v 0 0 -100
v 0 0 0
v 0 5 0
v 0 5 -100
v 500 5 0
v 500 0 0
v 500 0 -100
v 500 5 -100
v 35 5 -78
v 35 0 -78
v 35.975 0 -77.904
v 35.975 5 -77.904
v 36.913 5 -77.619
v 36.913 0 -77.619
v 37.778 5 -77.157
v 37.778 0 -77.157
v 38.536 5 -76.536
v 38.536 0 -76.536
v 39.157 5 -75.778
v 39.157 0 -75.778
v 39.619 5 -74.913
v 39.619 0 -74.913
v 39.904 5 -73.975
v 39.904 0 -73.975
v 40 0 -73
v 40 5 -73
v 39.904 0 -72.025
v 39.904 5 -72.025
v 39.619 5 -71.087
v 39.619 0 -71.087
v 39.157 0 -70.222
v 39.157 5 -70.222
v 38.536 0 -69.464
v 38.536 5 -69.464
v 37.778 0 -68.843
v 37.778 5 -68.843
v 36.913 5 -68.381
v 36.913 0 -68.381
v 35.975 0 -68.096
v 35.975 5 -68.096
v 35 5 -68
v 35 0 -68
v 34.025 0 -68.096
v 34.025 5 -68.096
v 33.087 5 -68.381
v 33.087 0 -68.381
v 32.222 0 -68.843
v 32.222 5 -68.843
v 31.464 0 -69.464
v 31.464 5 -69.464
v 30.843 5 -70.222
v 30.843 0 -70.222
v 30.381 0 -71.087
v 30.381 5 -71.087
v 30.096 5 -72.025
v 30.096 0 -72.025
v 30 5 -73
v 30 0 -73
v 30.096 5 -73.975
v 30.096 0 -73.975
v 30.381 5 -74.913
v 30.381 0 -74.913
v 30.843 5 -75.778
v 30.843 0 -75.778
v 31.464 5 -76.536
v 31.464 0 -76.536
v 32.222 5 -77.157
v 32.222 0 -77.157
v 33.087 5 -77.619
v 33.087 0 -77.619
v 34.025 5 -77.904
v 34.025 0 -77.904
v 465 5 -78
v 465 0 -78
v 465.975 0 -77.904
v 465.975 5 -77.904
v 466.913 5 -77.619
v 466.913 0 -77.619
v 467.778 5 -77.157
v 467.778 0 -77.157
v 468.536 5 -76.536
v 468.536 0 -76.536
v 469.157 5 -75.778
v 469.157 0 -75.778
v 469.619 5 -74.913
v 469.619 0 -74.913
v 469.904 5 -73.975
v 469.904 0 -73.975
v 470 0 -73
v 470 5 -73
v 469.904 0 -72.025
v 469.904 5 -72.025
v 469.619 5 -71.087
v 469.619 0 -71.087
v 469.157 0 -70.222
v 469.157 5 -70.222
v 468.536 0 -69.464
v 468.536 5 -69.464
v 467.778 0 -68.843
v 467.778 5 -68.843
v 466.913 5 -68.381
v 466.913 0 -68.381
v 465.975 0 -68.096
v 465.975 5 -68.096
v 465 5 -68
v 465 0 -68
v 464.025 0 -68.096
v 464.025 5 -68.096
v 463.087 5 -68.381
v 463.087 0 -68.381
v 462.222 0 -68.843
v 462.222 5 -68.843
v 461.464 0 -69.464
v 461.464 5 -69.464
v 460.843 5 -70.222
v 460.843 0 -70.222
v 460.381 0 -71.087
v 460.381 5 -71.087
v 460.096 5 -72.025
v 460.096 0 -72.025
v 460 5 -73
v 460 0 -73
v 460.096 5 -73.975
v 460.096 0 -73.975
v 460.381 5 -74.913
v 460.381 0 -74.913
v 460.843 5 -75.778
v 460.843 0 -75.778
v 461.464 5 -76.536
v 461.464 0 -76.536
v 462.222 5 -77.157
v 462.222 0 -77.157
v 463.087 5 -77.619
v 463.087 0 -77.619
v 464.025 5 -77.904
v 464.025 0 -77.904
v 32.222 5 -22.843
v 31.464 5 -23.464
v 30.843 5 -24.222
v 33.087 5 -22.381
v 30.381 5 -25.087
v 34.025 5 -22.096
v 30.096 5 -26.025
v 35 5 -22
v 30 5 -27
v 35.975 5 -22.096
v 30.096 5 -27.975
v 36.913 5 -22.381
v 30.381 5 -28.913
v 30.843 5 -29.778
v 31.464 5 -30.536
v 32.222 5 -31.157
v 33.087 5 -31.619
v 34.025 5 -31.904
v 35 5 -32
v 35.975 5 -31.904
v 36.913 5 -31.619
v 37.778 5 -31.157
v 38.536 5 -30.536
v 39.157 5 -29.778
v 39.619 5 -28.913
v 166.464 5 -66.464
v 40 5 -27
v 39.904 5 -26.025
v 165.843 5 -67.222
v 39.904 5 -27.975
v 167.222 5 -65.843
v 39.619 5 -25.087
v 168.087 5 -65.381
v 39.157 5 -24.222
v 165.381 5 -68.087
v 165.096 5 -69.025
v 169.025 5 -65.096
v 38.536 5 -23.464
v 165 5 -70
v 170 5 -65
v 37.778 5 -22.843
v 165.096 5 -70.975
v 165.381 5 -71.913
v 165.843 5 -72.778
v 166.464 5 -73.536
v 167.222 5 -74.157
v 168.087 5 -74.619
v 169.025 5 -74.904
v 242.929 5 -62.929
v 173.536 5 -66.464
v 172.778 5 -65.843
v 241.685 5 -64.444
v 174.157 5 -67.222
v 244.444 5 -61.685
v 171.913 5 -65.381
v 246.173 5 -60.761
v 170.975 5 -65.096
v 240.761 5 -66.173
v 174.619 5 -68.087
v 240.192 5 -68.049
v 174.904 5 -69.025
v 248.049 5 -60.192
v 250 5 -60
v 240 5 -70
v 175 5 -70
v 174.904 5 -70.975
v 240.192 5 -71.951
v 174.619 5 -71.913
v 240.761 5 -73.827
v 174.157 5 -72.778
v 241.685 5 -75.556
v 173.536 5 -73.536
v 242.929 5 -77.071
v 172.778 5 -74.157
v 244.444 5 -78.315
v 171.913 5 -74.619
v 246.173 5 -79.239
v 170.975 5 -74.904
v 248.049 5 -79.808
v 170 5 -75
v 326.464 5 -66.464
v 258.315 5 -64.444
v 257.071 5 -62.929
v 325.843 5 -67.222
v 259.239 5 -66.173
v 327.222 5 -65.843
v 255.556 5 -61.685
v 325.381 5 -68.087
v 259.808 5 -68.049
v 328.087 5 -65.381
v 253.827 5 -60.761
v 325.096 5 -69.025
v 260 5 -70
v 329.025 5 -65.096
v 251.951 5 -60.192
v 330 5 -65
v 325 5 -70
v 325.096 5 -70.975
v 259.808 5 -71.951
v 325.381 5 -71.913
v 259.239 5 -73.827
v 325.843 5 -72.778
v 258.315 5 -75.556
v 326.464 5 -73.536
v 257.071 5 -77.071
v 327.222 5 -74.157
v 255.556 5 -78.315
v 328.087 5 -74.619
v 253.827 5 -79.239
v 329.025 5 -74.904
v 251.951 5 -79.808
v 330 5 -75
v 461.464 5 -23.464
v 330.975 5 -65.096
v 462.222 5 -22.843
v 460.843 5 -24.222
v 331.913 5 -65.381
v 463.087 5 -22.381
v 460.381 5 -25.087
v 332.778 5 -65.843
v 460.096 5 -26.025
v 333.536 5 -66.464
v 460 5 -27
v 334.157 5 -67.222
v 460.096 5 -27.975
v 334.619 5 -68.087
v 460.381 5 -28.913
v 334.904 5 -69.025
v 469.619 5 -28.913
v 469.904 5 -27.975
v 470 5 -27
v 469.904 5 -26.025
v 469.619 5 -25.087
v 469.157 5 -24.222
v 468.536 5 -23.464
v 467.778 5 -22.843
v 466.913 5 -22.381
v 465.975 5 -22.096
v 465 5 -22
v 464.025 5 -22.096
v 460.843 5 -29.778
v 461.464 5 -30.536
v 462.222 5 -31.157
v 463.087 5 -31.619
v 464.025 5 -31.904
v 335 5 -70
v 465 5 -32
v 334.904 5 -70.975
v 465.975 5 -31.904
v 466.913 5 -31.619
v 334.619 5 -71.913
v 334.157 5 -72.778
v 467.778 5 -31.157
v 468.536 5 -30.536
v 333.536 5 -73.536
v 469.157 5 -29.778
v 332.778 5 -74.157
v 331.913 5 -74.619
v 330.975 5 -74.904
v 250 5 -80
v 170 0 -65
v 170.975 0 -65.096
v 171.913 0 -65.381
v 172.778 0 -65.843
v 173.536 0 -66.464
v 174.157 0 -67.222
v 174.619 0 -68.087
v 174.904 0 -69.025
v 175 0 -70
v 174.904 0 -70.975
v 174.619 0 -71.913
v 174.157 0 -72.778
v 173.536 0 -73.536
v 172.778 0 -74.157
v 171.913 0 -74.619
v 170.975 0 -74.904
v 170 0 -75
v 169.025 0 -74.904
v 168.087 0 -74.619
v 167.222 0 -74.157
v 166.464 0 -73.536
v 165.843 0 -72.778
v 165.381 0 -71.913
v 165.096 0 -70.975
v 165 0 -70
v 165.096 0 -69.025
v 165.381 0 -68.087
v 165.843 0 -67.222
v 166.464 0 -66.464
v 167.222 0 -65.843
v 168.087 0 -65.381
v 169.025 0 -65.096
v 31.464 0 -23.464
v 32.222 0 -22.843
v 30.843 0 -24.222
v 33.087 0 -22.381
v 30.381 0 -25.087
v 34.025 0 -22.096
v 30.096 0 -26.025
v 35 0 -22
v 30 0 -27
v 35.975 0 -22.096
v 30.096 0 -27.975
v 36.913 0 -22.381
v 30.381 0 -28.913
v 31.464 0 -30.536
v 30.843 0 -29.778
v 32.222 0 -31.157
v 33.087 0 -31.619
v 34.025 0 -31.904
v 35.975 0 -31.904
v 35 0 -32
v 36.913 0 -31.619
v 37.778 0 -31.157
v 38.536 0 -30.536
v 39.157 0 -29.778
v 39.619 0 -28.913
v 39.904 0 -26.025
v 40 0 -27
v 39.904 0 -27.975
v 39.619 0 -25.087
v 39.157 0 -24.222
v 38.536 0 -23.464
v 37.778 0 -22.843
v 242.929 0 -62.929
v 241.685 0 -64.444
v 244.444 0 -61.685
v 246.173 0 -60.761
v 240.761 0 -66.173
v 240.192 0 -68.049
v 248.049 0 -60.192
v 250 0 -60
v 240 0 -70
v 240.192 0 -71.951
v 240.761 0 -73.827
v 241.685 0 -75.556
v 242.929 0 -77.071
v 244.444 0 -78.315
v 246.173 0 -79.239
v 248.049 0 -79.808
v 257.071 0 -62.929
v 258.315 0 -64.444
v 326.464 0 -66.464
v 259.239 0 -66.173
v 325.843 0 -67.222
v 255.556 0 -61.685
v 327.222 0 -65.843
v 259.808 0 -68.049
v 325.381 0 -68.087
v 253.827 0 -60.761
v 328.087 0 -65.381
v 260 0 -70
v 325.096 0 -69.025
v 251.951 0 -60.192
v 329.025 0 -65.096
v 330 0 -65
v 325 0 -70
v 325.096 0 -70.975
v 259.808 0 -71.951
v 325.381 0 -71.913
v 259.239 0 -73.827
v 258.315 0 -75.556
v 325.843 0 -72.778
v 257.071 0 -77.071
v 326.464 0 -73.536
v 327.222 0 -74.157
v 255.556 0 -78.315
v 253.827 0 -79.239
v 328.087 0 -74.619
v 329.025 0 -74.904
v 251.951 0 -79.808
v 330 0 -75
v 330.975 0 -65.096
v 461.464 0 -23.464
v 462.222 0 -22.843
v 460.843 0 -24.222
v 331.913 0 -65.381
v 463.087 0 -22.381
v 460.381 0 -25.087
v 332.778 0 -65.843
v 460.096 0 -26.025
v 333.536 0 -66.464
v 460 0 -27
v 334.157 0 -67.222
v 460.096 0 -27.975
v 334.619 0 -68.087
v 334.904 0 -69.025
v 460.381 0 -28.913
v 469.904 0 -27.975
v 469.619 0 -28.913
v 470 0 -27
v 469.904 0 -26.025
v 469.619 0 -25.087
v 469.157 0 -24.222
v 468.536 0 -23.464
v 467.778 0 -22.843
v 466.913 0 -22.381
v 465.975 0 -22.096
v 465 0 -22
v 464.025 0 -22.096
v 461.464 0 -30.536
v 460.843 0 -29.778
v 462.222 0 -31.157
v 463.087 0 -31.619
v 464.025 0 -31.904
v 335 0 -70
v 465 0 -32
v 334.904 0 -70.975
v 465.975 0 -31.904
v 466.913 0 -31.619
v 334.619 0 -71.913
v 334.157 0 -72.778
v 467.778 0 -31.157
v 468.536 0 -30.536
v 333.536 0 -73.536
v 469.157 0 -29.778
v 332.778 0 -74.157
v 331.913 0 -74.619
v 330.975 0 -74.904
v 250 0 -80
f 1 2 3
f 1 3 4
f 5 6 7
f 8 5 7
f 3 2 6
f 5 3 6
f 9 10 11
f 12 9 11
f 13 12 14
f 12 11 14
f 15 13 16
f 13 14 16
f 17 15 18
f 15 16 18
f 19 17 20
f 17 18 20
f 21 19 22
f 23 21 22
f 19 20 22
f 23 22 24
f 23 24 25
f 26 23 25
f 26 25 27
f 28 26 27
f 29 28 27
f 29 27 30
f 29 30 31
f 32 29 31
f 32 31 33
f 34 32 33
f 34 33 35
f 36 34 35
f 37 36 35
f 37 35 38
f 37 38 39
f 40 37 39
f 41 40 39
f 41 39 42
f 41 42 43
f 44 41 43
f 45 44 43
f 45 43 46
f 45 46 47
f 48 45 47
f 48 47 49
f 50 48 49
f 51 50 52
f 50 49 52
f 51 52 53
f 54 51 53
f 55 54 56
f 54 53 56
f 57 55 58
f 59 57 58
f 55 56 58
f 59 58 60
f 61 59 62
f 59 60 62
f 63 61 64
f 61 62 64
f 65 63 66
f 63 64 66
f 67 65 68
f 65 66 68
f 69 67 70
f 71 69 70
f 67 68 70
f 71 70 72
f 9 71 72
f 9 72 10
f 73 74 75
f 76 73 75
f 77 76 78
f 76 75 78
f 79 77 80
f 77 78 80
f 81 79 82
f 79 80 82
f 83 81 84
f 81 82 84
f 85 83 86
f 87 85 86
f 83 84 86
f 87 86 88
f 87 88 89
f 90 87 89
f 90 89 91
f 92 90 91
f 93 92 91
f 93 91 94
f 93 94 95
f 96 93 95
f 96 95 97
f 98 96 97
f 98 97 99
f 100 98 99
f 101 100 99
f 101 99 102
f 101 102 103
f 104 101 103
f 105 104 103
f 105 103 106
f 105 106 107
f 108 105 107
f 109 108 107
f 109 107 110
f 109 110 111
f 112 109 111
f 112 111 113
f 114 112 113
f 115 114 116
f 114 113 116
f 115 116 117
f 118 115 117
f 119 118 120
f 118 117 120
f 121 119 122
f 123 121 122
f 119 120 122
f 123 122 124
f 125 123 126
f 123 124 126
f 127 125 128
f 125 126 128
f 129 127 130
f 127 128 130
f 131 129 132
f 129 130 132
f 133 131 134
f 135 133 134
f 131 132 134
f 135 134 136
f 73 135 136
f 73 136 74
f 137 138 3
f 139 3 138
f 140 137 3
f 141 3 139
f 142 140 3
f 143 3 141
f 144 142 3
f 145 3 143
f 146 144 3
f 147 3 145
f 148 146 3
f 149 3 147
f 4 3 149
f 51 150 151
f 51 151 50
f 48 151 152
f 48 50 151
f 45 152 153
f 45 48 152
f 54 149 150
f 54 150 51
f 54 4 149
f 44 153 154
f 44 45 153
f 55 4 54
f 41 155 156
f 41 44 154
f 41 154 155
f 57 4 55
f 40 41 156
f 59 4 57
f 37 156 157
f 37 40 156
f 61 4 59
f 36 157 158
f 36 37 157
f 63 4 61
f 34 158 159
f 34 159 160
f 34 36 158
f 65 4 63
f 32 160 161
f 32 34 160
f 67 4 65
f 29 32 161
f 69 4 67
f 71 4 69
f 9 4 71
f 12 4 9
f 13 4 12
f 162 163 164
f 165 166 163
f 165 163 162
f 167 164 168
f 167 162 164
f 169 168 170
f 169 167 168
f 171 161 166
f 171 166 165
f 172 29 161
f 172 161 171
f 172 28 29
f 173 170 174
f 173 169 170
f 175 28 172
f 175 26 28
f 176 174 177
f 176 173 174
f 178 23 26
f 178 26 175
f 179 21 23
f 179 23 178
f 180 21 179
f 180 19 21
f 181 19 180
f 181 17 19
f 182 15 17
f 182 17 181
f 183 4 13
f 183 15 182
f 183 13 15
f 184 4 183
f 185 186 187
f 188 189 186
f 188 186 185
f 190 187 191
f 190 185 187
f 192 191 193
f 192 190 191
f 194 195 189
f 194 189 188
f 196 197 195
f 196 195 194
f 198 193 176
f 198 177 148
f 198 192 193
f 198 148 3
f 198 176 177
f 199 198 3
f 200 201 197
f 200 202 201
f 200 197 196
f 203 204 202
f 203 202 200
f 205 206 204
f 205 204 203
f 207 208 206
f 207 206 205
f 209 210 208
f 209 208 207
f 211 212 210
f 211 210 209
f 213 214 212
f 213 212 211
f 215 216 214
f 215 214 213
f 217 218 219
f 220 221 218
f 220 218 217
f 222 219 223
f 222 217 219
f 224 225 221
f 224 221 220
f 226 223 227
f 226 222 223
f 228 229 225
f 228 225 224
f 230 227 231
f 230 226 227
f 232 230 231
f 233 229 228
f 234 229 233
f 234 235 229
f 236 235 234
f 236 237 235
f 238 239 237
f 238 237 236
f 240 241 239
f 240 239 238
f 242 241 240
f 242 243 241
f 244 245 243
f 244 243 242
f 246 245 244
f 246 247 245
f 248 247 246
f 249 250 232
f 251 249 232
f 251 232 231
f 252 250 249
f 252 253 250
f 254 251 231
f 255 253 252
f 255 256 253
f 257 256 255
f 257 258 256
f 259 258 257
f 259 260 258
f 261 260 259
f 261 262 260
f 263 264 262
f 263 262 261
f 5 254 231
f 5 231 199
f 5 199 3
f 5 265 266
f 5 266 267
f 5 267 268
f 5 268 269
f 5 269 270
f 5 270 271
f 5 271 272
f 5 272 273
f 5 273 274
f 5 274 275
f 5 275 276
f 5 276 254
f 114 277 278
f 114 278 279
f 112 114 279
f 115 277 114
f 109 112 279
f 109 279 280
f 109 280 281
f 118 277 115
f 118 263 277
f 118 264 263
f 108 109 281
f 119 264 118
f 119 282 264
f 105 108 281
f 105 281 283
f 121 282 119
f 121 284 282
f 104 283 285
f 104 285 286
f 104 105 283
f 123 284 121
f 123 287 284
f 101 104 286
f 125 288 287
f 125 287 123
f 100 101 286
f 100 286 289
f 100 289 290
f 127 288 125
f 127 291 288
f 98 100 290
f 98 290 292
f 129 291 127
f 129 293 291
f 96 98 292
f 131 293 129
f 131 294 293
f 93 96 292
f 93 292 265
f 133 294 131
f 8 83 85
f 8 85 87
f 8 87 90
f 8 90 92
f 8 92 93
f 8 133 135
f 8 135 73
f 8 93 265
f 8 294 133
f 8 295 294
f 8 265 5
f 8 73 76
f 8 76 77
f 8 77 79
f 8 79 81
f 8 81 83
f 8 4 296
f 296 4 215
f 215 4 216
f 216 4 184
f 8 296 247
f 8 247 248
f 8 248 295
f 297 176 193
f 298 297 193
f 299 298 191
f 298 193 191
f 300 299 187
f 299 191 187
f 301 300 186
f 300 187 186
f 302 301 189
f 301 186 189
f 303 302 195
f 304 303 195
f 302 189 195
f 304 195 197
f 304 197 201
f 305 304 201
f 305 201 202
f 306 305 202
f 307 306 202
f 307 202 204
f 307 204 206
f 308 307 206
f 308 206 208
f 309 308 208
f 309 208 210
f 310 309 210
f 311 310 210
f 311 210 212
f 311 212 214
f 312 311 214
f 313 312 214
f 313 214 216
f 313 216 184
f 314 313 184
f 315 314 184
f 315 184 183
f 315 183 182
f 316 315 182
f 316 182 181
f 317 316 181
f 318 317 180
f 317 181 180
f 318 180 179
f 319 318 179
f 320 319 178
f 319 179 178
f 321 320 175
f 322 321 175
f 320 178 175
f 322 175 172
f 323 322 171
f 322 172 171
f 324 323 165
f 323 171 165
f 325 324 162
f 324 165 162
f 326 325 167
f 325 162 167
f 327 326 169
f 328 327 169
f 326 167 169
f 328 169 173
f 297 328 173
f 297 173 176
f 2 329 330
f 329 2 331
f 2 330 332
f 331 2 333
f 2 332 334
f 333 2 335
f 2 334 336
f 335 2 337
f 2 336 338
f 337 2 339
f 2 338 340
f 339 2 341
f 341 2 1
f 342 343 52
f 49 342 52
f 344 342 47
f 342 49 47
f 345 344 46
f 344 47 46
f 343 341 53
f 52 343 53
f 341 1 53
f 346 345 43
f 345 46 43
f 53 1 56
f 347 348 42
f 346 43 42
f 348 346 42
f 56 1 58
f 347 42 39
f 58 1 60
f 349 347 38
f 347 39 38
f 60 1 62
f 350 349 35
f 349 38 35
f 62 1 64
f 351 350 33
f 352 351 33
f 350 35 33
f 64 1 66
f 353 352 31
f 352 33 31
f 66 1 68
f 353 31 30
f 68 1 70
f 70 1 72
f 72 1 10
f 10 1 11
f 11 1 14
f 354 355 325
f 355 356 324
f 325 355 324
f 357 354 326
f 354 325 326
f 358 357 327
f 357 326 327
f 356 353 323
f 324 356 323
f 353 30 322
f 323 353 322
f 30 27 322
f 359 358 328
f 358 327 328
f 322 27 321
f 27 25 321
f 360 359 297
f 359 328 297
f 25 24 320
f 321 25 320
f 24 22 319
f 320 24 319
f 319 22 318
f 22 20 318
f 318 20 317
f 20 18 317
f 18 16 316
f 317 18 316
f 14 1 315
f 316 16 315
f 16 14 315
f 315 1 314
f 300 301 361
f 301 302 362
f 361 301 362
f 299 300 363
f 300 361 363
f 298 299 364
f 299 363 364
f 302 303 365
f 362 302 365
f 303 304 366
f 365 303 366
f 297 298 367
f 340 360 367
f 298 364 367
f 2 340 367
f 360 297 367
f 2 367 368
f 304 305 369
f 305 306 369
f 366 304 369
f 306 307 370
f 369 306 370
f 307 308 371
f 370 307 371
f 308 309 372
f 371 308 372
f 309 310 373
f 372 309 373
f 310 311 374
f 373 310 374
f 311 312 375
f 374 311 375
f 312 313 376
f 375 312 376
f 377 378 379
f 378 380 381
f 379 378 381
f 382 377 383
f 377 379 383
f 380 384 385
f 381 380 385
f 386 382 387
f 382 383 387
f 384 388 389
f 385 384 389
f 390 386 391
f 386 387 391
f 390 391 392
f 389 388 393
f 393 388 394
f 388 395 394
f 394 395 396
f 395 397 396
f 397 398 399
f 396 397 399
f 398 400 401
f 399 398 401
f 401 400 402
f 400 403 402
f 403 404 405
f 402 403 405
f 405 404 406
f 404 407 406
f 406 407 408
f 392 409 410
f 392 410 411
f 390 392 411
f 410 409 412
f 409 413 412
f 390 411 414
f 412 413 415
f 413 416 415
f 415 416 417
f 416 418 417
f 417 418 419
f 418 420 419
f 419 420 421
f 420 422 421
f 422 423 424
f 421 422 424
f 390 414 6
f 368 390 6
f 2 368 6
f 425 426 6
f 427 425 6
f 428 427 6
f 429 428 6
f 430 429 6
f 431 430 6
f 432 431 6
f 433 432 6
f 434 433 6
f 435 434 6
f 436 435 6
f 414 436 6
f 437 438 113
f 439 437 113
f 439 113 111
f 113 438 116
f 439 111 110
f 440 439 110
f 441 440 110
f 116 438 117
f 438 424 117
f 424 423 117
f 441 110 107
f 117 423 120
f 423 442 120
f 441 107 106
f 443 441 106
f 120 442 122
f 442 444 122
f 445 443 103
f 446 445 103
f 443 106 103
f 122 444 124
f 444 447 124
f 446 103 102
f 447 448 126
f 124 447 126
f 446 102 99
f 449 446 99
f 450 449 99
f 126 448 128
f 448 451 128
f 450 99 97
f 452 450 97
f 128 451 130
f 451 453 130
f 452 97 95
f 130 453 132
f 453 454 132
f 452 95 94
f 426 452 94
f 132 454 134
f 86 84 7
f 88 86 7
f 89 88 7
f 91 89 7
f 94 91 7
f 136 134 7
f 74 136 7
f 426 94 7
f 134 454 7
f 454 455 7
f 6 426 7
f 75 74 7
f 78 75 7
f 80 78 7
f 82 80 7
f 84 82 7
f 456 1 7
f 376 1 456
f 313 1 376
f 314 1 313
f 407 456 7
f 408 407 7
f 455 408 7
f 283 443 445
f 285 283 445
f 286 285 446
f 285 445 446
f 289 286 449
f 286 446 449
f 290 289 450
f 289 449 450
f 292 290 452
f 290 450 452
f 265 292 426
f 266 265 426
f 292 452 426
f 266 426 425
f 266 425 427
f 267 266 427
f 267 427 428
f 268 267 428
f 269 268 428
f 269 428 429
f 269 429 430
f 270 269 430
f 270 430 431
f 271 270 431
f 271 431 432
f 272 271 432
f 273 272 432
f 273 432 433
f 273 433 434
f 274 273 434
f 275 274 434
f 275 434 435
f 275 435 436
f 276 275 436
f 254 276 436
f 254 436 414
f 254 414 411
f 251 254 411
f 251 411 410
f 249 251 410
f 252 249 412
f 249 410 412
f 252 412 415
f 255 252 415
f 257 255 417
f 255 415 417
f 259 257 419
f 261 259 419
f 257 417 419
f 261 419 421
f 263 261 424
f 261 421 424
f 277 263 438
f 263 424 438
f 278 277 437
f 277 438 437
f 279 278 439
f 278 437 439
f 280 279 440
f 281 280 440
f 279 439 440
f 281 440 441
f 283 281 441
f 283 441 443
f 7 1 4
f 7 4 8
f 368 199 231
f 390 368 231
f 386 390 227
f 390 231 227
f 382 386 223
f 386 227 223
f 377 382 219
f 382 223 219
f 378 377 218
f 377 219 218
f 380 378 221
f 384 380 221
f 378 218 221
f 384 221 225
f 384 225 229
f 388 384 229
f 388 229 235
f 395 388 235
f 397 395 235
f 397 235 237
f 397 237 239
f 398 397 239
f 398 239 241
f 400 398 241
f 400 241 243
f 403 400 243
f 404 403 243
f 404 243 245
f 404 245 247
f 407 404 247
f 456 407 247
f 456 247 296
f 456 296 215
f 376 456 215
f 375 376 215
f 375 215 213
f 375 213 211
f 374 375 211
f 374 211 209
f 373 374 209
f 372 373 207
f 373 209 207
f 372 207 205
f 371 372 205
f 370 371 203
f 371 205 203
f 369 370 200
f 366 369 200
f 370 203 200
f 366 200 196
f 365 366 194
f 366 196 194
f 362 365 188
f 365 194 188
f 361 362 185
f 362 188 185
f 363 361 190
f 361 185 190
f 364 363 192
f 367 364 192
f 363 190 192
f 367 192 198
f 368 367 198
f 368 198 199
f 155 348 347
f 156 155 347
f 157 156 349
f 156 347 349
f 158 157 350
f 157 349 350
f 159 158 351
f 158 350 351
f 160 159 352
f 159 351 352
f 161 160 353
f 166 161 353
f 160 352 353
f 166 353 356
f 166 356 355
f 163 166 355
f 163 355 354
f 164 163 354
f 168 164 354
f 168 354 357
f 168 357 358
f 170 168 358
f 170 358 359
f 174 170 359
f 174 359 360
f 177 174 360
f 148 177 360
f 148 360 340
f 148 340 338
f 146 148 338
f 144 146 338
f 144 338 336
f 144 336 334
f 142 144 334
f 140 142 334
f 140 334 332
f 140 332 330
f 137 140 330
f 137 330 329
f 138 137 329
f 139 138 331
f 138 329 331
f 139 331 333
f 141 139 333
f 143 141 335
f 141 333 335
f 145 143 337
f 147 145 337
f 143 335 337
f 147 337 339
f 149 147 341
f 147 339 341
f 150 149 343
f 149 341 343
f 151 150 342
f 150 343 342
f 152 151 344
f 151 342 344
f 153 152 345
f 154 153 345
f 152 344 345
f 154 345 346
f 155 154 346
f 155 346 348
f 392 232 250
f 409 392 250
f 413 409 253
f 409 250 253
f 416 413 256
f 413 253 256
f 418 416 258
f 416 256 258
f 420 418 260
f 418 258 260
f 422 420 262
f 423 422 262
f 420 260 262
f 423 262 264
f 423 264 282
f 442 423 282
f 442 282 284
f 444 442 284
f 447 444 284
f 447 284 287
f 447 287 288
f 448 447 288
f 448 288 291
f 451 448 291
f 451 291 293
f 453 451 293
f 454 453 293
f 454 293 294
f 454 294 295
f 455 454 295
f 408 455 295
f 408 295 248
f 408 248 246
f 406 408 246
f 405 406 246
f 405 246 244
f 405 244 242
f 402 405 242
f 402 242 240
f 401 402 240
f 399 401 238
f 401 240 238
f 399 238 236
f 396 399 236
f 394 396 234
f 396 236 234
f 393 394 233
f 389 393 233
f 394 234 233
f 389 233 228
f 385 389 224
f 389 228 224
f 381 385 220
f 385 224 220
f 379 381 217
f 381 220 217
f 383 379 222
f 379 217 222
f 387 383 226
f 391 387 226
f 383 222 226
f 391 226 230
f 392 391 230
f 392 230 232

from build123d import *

# Parameters (mm, degrees)
SKETCH1_W           = 500
SKETCH1_H           = 100
BOSS_EXTRUDE1_DEPTH = 5
SKETCH3_R           = 10
CUT_EXTRUDE1_DEPTH  = 510.926465287
SKETCH4_R           = 5
CUT_EXTRUDE2_DEPTH  = 510.926465287
SKETCH5_R           = 5
CUT_EXTRUDE3_DEPTH  = 510.926465287
SKETCH7_R           = 5
CUT_EXTRUDE4_DEPTH  = 510.926465287


with BuildPart() as part:
    # Sketch1 → Boss-Extrude1 (new body)
    with BuildSketch(Plane(origin=(0, 0, 0), x_dir=(1, 0, 0), z_dir=(0, 1, 0))):
        with Locations((250, 50)):
            Rectangle(SKETCH1_W, SKETCH1_H)
    extrude(amount=BOSS_EXTRUDE1_DEPTH)

    # Sketch3 → Cut-Extrude1 (cut, through all)
    with BuildSketch(Plane(origin=(0, 5, 0), x_dir=(1, 0, 0), z_dir=(0, 1, 0))):
        with Locations(Location((250, 70, 0), (0, 0, 270))):
            Circle(SKETCH3_R)
    extrude(amount=-CUT_EXTRUDE1_DEPTH, mode=Mode.SUBTRACT)

    # Sketch4 → Cut-Extrude2 (cut, through all)
    with BuildSketch(Plane(origin=(0, 5, 0), x_dir=(1, 0, 0), z_dir=(0, 1, 0))):
        with Locations(Location((170, 70, 0), (0, 0, 270))):
            Circle(SKETCH4_R)
    extrude(amount=-CUT_EXTRUDE2_DEPTH, mode=Mode.SUBTRACT)

    # Sketch5 → Cut-Extrude3 (cut, through all)
    with BuildSketch(Plane(origin=(0, 5, 0), x_dir=(1, 0, 0), z_dir=(0, 1, 0))):
        with Locations(Location((330, 70, 0), (0, 0, 270))):
            Circle(SKETCH5_R)
    extrude(amount=-CUT_EXTRUDE3_DEPTH, mode=Mode.SUBTRACT)

    # Sketch7 → Cut-Extrude4 (cut, through all)
    with BuildSketch(Plane(origin=(0, 0, 0), x_dir=(-1, 0, 0), z_dir=(0, -1, 0))):
        with Locations(Location((-465, 73, 0), (0, 0, 90))):
            Circle(SKETCH7_R)
        with Locations(Location((-465, 27, 0), (0, 0, 90))):
            Circle(SKETCH7_R)
        with Locations(Location((-35, 27, 0), (0, 0, 90))):
            Circle(SKETCH7_R)
        with Locations(Location((-35, 73, 0), (0, 0, 90))):
            Circle(SKETCH7_R)
    extrude(amount=-CUT_EXTRUDE4_DEPTH, mode=Mode.SUBTRACT)


solid = part.part
